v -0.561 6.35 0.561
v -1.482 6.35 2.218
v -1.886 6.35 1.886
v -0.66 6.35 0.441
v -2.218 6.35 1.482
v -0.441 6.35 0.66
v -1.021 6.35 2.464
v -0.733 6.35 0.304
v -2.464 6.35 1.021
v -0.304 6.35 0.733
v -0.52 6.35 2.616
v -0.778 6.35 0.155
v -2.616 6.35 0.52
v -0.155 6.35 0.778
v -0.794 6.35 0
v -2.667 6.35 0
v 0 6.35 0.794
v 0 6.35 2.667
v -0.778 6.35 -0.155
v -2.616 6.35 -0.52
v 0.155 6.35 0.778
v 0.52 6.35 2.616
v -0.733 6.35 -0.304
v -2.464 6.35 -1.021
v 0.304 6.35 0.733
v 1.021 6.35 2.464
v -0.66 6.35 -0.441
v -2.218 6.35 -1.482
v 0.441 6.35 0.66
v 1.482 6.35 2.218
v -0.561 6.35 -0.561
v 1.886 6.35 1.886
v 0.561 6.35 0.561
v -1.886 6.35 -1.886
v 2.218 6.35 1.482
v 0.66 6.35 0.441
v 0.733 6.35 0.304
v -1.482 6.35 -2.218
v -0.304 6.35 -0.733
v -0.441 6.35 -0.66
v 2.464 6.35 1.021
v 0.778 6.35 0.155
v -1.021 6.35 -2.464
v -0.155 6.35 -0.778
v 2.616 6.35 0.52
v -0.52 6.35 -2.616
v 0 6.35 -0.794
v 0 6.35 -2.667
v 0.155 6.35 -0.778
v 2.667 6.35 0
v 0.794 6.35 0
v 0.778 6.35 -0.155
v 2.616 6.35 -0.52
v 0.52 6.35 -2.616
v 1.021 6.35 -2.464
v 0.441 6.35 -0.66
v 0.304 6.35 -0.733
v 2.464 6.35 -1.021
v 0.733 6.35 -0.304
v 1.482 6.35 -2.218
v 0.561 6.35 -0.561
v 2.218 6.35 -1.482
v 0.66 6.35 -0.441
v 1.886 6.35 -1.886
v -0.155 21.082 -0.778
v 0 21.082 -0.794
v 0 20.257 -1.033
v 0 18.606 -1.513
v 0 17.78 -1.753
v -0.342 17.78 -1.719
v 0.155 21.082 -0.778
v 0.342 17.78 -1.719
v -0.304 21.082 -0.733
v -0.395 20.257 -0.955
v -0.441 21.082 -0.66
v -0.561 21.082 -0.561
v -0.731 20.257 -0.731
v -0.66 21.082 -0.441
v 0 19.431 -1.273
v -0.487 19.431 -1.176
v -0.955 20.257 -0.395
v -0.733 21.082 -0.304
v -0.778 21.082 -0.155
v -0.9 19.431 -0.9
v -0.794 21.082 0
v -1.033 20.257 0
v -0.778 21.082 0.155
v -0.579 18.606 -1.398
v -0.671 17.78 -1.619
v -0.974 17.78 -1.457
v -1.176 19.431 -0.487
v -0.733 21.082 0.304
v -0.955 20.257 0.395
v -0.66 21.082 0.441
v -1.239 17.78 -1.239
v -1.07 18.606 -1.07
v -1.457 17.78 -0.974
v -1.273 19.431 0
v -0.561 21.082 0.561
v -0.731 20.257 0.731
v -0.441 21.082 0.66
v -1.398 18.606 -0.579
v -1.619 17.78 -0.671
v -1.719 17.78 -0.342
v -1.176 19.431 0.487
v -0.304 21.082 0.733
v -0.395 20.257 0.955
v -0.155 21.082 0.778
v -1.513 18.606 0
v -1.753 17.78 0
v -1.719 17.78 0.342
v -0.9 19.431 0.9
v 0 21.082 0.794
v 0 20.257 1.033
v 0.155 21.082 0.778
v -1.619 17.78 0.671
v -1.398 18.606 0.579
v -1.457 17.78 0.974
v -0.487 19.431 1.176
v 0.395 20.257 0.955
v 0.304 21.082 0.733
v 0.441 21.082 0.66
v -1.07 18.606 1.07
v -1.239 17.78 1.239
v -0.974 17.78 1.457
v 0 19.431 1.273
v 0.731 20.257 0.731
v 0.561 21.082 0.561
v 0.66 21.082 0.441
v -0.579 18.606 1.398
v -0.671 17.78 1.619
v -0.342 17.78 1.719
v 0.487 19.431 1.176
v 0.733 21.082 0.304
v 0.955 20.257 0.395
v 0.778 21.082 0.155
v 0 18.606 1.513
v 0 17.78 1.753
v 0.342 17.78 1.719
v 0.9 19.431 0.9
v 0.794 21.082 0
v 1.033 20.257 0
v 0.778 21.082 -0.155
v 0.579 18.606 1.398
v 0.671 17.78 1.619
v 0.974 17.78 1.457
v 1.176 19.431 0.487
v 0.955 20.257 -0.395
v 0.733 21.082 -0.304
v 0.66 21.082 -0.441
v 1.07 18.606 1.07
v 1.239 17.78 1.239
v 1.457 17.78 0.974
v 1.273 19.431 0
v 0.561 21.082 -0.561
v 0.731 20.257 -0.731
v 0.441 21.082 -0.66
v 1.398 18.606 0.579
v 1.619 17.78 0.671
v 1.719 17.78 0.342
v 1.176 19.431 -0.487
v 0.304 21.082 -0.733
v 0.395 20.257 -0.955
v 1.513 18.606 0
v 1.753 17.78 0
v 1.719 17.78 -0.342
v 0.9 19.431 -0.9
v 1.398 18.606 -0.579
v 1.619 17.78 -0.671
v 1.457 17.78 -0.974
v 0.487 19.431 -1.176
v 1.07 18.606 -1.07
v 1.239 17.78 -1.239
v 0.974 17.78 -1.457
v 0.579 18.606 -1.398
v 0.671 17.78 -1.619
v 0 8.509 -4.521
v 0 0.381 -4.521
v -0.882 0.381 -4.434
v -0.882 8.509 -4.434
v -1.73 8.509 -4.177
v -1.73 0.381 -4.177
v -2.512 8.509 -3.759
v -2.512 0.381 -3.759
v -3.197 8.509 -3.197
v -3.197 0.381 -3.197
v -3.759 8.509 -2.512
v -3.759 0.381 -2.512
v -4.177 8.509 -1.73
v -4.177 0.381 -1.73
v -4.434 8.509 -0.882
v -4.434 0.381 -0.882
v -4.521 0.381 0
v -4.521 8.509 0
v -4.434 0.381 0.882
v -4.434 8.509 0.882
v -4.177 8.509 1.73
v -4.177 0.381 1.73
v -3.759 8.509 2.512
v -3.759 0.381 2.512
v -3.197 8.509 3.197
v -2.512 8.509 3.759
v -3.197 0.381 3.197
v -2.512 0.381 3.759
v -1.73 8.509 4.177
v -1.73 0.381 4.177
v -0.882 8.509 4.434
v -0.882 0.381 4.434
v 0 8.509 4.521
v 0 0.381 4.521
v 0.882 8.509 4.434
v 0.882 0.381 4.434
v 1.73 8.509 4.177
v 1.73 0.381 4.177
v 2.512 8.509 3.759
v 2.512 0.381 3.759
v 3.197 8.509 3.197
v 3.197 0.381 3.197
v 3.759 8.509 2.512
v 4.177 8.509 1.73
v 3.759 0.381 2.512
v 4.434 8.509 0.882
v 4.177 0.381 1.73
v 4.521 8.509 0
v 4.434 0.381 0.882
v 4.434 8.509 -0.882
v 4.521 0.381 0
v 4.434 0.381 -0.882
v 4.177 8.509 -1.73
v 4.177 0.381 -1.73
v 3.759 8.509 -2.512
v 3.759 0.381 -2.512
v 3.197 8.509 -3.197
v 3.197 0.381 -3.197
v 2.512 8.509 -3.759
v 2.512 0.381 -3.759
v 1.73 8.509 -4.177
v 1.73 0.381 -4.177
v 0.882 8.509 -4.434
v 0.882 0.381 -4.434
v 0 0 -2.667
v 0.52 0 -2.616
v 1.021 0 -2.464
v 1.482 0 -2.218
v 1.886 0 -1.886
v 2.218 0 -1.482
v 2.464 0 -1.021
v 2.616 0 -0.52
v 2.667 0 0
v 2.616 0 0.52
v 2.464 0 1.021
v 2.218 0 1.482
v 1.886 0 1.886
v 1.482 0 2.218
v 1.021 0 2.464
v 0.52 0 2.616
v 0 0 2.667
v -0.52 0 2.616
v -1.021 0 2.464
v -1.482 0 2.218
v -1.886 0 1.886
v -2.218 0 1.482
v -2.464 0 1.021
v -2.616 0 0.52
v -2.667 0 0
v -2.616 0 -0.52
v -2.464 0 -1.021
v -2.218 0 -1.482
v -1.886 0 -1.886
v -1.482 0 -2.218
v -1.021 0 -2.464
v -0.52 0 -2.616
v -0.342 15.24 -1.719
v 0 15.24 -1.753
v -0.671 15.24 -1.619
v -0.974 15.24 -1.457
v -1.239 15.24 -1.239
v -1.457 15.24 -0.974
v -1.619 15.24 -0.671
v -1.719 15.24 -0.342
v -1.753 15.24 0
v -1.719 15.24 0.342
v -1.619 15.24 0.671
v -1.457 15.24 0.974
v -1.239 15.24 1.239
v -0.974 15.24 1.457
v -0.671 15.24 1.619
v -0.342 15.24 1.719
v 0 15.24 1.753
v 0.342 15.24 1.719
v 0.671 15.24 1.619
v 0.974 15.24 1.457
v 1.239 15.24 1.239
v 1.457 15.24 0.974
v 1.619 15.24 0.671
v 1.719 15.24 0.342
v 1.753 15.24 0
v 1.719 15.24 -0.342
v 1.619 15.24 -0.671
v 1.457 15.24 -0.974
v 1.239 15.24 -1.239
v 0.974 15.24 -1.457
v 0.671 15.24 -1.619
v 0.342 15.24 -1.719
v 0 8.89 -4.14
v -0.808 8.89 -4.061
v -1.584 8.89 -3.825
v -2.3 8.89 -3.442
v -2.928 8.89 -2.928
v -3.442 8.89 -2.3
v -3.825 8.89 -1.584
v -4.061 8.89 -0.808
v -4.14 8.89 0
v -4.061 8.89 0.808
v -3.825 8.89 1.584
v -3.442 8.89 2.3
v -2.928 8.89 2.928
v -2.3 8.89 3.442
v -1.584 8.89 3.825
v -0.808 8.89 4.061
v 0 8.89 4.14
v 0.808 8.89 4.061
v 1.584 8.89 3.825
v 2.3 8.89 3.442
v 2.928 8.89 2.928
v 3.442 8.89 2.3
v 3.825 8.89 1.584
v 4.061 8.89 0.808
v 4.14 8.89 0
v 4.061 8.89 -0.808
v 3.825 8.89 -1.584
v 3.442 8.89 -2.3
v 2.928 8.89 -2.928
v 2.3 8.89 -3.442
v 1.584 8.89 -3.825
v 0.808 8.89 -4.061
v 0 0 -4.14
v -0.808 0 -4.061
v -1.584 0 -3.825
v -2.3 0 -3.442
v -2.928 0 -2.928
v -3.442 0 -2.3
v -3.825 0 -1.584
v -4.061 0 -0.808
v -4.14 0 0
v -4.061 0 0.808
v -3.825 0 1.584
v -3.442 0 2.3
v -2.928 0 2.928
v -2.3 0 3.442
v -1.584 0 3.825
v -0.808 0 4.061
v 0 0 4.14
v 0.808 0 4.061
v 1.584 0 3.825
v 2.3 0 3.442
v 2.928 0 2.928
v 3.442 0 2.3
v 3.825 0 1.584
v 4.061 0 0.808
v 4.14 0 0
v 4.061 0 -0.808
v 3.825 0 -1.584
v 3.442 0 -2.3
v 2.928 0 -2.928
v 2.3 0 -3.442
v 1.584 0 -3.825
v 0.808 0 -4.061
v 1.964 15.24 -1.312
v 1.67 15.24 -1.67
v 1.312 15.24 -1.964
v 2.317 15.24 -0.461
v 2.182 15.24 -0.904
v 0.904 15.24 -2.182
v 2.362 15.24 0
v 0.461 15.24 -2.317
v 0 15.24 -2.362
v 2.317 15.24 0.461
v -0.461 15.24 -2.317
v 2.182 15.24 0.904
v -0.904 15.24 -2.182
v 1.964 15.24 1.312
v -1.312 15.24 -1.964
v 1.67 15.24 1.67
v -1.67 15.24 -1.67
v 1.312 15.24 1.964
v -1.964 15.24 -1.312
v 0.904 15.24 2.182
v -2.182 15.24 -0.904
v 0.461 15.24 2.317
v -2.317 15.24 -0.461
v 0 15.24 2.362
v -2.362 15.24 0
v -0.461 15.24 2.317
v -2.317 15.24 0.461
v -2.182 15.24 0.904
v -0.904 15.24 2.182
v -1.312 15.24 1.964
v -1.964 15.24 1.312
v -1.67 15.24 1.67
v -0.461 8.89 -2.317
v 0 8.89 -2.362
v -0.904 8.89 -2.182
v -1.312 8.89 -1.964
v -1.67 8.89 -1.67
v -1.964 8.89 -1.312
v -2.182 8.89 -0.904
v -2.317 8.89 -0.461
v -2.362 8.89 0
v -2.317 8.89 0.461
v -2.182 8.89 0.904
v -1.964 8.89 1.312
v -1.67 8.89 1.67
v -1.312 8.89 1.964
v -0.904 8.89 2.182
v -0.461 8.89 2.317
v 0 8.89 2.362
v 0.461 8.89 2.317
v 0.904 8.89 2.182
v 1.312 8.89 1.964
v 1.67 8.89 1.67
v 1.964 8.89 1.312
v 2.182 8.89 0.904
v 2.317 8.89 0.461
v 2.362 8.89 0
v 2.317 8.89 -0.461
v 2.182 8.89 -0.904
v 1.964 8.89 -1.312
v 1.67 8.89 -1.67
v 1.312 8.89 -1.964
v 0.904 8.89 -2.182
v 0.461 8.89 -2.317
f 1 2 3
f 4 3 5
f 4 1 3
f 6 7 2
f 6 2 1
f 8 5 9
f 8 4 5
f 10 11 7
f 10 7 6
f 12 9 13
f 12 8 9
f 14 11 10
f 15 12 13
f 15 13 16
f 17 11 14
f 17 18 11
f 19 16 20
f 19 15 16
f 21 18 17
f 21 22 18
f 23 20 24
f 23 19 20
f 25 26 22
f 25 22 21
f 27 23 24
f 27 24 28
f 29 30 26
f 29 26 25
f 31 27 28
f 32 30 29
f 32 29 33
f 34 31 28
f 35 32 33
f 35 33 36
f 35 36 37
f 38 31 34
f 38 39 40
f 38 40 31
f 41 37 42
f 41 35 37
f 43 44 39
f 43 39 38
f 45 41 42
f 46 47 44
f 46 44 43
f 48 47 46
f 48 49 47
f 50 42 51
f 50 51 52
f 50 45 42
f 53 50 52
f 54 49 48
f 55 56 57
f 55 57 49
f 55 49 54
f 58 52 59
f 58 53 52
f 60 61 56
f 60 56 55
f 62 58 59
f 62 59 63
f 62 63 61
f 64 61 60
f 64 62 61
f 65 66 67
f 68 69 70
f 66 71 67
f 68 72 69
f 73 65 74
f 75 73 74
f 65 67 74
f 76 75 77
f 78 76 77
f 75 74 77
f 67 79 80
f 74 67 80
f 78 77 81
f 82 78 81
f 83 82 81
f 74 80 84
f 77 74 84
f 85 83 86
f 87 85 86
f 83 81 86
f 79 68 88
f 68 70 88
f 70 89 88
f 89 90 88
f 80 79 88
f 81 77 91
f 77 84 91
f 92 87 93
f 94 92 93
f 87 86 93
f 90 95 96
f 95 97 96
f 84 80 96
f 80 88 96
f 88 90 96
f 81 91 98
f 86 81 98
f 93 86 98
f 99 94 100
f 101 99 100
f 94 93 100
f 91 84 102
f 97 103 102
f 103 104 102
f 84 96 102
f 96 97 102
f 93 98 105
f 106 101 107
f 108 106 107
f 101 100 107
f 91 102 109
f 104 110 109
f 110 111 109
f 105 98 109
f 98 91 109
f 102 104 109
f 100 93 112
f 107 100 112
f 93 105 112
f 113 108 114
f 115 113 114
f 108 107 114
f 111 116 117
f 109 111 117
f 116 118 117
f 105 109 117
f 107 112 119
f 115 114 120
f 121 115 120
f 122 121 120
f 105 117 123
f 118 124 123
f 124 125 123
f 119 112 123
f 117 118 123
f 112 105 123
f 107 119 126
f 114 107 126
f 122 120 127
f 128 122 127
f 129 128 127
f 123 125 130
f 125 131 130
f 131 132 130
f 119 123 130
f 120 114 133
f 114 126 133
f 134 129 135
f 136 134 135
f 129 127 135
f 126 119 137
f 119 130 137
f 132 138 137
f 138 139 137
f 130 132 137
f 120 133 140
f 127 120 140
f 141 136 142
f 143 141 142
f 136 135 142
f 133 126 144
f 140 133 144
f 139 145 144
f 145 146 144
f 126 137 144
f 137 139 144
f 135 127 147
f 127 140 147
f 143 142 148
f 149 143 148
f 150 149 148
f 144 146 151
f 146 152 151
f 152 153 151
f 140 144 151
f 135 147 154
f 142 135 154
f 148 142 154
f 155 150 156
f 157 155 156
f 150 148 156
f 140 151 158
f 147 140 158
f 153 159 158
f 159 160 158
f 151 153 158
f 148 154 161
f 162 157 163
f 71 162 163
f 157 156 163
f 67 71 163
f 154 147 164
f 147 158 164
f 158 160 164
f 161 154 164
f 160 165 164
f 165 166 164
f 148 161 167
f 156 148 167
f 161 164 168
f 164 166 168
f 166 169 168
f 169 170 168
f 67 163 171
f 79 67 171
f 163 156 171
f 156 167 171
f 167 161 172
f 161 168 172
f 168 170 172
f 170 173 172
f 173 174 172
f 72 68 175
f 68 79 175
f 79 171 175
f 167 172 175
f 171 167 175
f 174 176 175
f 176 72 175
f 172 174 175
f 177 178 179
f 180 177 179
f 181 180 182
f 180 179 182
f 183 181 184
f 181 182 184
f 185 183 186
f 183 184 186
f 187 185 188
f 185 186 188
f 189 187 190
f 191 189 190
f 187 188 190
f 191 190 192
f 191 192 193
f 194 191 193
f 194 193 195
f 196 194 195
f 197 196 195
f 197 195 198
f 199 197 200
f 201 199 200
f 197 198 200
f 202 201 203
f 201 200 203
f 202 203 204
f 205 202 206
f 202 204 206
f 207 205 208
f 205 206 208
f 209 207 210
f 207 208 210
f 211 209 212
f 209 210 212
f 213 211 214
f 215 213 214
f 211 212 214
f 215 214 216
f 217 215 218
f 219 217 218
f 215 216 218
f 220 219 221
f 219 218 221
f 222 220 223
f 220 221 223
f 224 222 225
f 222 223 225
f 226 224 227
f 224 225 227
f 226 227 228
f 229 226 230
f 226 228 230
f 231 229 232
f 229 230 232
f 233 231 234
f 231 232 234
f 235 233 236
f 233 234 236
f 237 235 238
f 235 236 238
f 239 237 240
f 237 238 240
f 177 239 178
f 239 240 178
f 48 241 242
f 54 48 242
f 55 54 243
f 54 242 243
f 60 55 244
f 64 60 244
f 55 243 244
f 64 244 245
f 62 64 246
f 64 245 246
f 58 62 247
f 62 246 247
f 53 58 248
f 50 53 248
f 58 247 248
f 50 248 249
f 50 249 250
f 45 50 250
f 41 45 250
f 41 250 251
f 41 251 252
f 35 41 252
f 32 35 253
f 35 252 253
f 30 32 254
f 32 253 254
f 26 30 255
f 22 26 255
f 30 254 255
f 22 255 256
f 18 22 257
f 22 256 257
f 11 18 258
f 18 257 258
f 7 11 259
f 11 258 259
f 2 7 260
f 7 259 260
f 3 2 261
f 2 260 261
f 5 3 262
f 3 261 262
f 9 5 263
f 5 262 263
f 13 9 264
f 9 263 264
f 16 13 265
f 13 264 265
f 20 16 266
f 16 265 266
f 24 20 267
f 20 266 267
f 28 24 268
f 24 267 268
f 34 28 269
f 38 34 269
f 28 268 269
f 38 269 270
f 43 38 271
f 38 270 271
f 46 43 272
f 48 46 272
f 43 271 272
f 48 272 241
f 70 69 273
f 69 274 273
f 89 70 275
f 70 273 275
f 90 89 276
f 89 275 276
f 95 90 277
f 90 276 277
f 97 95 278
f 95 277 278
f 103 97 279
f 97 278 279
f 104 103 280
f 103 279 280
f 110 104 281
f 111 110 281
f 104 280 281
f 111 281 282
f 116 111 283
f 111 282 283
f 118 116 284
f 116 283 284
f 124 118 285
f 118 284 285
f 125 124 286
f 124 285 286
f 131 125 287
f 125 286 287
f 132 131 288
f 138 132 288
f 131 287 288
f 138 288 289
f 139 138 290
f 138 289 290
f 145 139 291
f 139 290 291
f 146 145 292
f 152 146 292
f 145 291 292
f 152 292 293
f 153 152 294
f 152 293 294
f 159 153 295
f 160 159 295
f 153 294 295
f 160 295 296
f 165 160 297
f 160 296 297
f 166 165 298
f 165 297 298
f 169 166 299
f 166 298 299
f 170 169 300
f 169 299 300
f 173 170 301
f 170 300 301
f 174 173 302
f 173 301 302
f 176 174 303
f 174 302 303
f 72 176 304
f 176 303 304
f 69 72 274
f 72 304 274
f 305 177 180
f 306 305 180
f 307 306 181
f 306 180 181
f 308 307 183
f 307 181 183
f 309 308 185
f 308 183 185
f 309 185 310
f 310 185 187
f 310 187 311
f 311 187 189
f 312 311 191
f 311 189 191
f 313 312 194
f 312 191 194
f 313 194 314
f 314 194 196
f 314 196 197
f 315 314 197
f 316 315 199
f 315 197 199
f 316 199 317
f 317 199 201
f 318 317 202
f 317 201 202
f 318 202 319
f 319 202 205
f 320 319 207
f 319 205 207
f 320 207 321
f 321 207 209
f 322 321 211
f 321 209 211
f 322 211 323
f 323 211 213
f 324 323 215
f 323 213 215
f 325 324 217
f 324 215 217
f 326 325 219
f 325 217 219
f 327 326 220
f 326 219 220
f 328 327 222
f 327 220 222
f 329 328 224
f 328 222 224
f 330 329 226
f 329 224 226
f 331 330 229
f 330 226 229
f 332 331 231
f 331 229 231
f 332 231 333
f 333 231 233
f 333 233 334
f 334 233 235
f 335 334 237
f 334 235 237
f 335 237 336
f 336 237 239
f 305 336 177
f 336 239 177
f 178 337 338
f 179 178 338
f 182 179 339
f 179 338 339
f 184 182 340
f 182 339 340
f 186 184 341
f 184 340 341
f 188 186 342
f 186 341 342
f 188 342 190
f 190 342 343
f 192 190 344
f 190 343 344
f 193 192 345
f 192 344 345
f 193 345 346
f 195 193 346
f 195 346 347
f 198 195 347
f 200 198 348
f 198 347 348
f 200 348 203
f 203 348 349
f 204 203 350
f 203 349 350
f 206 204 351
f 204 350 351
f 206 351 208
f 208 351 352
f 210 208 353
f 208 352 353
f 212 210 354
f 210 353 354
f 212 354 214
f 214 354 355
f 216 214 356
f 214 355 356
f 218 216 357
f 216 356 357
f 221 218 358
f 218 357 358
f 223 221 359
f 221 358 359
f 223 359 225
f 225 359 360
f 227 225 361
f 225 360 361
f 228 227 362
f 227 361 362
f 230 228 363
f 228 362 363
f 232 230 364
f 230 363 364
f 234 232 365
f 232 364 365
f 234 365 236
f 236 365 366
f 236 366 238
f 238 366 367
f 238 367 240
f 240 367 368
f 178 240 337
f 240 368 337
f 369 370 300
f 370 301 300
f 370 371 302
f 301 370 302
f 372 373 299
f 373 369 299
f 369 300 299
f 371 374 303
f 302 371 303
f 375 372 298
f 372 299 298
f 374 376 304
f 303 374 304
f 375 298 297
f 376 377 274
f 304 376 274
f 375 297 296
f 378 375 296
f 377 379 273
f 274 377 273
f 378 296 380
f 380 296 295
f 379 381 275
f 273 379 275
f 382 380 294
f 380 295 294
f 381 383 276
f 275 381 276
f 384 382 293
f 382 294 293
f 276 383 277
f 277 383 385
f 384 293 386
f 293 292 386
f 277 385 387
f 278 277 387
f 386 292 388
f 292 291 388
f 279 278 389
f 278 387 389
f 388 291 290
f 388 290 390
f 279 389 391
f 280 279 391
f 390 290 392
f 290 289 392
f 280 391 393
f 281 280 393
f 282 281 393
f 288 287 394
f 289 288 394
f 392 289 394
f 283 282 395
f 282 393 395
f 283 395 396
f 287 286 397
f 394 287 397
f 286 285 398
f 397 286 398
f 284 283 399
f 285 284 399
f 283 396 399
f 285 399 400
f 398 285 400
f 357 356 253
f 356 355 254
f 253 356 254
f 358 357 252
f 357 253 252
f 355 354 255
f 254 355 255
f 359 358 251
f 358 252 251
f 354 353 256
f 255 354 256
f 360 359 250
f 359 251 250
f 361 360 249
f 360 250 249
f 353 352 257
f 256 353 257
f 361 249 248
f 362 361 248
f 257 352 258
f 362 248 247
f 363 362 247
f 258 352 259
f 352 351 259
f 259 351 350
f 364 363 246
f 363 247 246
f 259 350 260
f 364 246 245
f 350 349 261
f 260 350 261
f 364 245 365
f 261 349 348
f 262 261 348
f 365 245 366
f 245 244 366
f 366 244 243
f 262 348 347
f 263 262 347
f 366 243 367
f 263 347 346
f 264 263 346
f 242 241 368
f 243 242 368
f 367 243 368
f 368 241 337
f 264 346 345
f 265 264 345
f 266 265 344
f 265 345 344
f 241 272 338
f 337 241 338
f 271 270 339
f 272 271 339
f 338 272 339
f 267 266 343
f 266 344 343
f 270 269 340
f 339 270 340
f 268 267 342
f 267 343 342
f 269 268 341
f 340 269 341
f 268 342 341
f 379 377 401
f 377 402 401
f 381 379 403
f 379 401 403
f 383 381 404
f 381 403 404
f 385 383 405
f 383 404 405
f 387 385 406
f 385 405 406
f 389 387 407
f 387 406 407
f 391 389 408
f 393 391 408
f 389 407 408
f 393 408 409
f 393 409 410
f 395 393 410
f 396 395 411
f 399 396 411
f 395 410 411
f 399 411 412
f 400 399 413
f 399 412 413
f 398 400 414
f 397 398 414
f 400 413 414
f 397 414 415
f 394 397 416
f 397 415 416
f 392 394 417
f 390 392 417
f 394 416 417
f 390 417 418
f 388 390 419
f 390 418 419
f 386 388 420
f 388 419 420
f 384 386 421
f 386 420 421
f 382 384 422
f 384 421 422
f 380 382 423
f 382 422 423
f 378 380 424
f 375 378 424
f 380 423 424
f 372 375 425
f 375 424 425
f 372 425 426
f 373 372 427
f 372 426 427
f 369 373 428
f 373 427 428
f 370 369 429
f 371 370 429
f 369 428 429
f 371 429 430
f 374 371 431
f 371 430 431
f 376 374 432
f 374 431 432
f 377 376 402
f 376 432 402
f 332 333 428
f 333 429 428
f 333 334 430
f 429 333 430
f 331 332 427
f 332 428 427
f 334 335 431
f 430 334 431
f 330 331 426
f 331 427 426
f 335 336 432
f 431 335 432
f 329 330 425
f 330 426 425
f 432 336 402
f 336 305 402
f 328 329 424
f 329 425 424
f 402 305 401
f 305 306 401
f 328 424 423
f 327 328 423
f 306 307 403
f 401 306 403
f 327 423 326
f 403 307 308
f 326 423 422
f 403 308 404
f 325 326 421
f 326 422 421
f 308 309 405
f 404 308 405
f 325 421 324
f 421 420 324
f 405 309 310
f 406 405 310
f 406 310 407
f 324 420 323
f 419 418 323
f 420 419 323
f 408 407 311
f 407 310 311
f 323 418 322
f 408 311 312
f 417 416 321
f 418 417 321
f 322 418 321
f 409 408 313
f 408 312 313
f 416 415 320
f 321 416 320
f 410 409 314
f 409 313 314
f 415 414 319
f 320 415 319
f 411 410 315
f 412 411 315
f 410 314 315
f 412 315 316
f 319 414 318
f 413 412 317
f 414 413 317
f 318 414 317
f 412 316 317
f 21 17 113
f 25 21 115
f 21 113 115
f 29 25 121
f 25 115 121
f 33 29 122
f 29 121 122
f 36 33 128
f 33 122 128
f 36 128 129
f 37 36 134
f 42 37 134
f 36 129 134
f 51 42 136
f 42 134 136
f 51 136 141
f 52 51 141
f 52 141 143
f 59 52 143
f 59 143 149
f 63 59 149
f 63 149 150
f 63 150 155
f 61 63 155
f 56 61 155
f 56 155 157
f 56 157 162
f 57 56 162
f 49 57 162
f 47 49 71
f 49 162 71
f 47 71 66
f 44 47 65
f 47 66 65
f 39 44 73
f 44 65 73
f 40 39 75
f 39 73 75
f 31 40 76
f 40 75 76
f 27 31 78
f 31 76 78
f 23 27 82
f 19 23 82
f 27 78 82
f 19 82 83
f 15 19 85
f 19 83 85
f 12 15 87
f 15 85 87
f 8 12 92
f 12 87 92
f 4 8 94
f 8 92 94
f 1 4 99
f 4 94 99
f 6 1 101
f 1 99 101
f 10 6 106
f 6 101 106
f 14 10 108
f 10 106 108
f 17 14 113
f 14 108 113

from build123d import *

# Parameters (mm, degrees)
CHAMFER1_SIZE      = 0.381
SKETCH2_R          = 2.667
CUT_EXTRUDE1_DEPTH = 6.35
SKETCH3_R          = 0.79375
CUT_EXTRUDE2_DEPTH = 23.030279682


with BuildPart() as part:
    # Sketch1 → Revolve1 (revolve)
    with BuildSketch(Plane.XY):
        Polygon((0, 21.082), (0.79375, 21.082), (1.7526, 17.78), (1.7526, 15.24), (2.3622, 15.24), (2.3622, 8.89), (4.5212, 8.89), (4.5212, 0), (0, 0), align=None)
    revolve(axis=Axis((0, 0, 0), (0, 1, 0)))

    # Chamfer1
    chamfer1_edges = [part.edges().sort_by_distance(p)[0] for p in [
        (-4.5212, 0, 0),
        (-4.5212, 8.89, 0),
    ]]
    chamfer(chamfer1_edges, length=CHAMFER1_SIZE)

    # Sketch2 → Cut-Extrude1 (cut)
    with BuildSketch(Plane.XZ):
        Circle(SKETCH2_R)
    extrude(amount=-CUT_EXTRUDE1_DEPTH, mode=Mode.SUBTRACT)

    # Sketch3 → Cut-Extrude2 (cut, through all)
    with BuildSketch(Plane(origin=(0, 21.082, 0), x_dir=(1, 0, 0), z_dir=(0, 1, 0))):
        Circle(SKETCH3_R)
    extrude(amount=-CUT_EXTRUDE2_DEPTH, mode=Mode.SUBTRACT)


solid = part.part
